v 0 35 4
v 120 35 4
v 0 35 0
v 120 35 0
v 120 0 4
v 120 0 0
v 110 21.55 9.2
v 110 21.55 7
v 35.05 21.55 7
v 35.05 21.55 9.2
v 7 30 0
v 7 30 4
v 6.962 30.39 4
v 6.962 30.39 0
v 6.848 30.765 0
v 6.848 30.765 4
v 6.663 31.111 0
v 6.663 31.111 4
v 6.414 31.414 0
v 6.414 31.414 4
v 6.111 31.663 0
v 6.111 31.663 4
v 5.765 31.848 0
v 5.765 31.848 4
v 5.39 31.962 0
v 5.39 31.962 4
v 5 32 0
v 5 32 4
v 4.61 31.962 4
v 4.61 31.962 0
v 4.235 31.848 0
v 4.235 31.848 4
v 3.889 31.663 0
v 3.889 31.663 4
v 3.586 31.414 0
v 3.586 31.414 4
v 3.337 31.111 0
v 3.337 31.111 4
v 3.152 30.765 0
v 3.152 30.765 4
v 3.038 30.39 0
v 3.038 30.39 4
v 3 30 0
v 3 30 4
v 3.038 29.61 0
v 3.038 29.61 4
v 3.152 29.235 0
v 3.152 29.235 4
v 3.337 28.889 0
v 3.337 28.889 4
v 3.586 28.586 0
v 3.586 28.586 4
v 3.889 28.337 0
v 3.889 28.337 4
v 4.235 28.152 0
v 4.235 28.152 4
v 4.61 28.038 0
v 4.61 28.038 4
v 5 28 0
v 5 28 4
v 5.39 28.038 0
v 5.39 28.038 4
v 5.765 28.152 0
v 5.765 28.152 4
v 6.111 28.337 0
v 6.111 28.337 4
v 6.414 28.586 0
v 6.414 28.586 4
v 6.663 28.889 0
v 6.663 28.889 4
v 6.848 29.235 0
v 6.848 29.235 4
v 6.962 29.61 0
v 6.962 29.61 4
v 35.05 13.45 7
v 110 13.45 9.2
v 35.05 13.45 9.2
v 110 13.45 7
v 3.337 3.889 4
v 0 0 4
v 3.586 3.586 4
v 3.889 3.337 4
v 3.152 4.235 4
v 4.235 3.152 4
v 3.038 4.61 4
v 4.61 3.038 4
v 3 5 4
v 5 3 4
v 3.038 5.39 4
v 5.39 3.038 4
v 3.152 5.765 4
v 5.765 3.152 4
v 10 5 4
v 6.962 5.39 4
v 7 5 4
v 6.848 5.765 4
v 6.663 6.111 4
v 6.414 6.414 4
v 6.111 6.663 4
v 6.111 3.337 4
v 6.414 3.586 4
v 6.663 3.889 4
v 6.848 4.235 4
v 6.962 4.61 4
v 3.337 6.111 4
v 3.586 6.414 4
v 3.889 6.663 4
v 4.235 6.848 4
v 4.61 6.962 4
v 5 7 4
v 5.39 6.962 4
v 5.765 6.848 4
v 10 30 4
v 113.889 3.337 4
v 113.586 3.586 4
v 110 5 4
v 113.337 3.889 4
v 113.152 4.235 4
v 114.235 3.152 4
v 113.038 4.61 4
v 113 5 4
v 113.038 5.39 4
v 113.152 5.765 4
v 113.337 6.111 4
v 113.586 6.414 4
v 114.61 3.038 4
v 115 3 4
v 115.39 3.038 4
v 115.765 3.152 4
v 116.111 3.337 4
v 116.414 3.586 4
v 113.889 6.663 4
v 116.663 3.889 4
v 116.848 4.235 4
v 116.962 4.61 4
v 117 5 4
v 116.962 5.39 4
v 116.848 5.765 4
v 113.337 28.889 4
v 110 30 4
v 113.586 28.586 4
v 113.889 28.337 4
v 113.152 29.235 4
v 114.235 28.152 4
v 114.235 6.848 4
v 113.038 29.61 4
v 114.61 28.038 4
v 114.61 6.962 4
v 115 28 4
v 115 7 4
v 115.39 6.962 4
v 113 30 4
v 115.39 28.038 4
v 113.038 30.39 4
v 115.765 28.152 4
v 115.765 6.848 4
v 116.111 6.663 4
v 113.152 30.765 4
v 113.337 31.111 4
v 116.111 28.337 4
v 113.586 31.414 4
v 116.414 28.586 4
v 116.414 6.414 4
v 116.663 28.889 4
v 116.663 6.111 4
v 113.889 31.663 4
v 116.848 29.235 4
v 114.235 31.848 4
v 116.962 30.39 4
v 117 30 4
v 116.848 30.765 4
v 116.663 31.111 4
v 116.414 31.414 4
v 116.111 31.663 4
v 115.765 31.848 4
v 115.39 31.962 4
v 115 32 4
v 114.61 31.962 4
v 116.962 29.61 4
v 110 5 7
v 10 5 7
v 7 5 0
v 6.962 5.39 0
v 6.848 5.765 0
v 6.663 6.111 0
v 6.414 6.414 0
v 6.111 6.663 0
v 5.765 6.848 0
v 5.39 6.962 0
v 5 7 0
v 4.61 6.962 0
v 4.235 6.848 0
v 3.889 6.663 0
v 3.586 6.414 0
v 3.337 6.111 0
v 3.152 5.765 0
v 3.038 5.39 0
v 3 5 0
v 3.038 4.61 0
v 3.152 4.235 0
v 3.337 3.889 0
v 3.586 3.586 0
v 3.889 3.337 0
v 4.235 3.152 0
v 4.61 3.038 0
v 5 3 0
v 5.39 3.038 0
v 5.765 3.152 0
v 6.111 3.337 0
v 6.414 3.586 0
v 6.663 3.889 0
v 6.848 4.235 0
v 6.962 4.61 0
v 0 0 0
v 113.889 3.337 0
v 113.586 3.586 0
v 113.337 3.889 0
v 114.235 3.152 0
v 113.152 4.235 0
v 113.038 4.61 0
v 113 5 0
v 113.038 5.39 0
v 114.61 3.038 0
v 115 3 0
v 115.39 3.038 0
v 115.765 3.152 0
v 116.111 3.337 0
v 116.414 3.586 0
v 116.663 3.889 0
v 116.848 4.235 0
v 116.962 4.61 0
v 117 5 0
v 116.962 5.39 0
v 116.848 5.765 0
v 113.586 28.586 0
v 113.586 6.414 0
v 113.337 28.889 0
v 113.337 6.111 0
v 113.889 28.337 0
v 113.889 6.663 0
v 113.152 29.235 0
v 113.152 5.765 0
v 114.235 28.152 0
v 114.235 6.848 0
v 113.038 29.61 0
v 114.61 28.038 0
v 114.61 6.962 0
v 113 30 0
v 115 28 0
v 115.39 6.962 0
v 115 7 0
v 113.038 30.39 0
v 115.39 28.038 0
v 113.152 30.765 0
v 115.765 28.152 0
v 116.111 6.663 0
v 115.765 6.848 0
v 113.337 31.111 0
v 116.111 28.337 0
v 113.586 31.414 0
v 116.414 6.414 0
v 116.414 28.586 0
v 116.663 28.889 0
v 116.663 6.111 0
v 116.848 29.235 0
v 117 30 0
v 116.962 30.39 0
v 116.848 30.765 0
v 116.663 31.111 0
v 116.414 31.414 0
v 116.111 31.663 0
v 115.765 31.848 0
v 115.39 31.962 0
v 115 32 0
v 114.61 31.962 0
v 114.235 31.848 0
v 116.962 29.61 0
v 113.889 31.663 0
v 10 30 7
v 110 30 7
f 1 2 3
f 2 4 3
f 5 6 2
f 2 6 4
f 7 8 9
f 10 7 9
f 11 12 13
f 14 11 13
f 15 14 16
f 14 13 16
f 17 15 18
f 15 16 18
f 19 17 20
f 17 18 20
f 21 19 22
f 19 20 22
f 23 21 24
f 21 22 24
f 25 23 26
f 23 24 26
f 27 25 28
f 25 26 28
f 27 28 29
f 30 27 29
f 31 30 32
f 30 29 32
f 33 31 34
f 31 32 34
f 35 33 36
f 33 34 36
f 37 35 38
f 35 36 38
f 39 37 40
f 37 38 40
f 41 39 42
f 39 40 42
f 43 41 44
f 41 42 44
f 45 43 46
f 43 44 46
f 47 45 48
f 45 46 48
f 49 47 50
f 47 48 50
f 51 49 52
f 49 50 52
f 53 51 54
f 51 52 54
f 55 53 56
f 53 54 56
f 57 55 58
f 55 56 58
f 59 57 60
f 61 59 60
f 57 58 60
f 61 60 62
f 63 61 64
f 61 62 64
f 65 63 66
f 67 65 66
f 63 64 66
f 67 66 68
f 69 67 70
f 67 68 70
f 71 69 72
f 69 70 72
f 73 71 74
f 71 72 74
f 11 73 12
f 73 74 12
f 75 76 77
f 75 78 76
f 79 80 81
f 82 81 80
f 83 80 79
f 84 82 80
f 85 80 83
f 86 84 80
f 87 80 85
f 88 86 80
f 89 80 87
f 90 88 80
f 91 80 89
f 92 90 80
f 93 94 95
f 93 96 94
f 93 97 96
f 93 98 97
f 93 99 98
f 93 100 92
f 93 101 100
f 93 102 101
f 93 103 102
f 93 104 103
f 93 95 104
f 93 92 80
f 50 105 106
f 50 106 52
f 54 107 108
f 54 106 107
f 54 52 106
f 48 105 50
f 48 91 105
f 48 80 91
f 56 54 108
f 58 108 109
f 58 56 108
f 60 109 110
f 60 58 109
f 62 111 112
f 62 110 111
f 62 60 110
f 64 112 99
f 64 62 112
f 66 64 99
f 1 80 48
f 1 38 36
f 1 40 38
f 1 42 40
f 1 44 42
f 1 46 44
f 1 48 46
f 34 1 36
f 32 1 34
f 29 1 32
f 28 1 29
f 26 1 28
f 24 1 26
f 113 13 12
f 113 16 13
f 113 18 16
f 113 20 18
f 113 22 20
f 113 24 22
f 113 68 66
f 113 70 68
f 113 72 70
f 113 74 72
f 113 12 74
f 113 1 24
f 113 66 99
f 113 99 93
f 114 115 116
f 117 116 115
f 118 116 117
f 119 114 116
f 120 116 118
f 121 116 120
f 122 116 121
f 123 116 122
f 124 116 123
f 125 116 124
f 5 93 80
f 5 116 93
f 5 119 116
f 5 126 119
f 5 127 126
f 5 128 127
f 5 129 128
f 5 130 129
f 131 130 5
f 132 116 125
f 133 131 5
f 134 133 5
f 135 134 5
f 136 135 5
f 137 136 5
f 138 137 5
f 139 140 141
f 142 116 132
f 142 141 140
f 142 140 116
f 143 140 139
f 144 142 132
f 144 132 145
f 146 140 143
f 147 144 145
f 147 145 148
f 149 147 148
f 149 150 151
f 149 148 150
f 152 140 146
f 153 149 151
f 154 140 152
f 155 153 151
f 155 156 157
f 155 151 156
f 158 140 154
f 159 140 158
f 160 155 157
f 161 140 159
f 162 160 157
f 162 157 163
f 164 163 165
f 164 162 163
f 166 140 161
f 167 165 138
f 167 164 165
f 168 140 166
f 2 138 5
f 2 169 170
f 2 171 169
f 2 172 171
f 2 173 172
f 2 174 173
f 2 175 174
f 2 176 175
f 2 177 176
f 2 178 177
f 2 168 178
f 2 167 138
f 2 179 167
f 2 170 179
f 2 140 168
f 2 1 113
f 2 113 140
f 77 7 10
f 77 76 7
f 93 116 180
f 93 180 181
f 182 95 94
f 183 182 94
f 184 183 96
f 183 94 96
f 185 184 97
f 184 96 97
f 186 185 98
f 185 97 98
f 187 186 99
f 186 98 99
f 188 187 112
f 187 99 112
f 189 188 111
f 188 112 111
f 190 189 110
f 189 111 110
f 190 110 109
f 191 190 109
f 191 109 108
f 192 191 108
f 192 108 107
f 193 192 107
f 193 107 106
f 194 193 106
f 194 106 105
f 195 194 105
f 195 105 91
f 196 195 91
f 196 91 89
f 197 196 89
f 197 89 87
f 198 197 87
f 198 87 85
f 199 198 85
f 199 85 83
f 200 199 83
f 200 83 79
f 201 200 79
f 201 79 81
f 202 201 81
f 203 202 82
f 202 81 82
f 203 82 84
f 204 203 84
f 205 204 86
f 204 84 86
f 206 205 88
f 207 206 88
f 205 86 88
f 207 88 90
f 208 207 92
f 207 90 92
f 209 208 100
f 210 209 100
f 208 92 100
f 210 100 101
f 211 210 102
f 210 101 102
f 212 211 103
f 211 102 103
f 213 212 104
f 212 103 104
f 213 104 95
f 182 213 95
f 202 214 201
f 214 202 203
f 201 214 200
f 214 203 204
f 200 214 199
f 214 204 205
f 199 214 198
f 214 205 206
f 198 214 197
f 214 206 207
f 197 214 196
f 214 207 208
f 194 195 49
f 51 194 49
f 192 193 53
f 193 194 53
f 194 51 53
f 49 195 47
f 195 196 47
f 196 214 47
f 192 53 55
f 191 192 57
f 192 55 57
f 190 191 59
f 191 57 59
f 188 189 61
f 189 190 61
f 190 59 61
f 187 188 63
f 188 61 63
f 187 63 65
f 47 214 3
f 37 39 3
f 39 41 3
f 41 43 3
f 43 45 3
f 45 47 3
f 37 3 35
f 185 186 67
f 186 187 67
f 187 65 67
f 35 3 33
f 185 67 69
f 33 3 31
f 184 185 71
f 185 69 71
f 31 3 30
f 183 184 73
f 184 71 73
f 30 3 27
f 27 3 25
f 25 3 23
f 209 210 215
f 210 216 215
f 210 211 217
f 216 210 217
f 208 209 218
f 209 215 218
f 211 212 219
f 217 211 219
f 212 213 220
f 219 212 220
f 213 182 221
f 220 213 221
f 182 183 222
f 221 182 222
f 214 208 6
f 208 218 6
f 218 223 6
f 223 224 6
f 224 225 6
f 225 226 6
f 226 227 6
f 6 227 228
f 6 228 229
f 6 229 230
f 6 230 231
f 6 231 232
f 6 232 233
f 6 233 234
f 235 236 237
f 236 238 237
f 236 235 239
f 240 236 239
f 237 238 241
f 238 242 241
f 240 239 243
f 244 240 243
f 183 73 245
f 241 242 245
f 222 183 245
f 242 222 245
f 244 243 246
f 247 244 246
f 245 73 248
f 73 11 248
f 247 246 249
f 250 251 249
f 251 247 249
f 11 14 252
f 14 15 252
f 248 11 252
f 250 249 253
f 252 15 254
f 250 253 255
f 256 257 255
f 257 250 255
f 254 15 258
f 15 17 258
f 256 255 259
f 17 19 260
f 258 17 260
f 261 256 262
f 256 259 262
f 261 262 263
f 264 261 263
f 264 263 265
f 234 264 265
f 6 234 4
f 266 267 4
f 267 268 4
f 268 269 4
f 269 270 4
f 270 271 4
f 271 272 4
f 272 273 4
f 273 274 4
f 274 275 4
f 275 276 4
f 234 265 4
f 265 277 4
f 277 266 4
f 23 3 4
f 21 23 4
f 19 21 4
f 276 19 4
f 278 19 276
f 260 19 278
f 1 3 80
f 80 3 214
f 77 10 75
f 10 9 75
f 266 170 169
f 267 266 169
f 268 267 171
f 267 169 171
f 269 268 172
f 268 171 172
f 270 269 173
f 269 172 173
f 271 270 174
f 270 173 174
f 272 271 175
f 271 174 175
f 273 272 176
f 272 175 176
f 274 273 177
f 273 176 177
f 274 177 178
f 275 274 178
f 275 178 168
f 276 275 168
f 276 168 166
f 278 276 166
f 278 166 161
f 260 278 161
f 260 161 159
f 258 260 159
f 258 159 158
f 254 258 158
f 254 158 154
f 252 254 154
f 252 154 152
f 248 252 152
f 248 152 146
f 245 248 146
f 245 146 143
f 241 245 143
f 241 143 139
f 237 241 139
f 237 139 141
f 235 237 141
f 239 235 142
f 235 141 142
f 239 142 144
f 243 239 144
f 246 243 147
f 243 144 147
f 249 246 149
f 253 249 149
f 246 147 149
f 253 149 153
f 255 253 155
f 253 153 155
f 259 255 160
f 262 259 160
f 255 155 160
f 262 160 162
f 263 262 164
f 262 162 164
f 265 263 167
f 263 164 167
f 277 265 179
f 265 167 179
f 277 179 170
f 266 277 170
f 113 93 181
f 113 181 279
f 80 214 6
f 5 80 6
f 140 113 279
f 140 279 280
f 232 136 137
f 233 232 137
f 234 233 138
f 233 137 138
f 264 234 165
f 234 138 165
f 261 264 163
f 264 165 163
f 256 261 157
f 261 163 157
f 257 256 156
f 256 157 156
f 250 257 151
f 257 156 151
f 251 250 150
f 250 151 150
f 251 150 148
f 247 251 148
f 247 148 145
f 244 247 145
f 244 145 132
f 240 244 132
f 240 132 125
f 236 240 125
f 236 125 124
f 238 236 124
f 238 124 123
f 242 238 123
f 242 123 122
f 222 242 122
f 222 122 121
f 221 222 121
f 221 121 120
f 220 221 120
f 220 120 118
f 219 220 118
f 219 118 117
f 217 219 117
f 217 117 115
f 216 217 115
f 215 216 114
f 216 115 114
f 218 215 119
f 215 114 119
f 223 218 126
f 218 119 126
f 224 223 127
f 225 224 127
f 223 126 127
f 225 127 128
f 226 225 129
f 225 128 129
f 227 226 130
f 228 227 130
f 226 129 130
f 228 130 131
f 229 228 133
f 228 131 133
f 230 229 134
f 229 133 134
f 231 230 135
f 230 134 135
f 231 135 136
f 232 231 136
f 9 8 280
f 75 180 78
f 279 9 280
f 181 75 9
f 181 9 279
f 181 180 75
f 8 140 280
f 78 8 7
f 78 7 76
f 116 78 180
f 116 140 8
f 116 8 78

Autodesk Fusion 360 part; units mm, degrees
sketch "Esboço1" plane through (0, 0, 0) normal (0, 0, 1) x (1, 0, 0)
  line L0 (0, 0) -> (120, 0)
  line L1 (120, 0) -> (120, 35)
  line L2 (120, 35) -> (0, 35)
  line L3 (0, 35) -> (0, 0)
  dimension "d1" = 120
  dimension "d2" = 35
extrude "Extrusão1" add sketch "Esboço1" along normal blind 4
sketch "Esboço2" plane through (0, 0, 4) normal (0, 0, 1) x (-1, 0, 0)
  line L0 (0, -35) -> (0, 0)
  line L1 (0, 0) -> (-120, 0)
  line L2 (-120, 0) -> (-120, -35)
  line L3 (-120, -35) -> (0, -35)
  line L4 (-10, -30) -> (-110, -30)
  line L5 (-110, -30) -> (-110, -5)
  line L6 (-110, -5) -> (-10, -5)
  line L7 (-10, -5) -> (-10, -30)
  point P0 (-5, -30)
  point P1 (-5, -5)
  point P2 (-115, -5)
  point P3 (-115, -30)
sketch "Esboço8" plane through (0, 0, 4) normal (0, 0, 1) x (1, 0, 0)
  circle A0 centre (5, 30) radius 2
  circle A1 centre (5, 5) radius 2
  circle A2 centre (115, 30) radius 2
  circle A3 centre (115, 5) radius 2
  dimension "d18" = 4
  dimension "d19" = 4
  dimension "d20" = 4
  dimension "d21" = 4
extrude "Extrusão7" cut sketch "Esboço8" against normal blind 20
extrude "Extrusão10" add sketch "Esboço2" along normal blind 3 contours L4 L5 L6 L7
sketch "Esboço10" plane through (0, 0, 7) normal (0, 0, 1) x (-1, 0, 0)
  line L0 (-10, -5) -> (-110, -5)
  line L1 (-110, -5) -> (-110, -30)
  line L2 (-110, -30) -> (-10, -30)
  line L3 (-10, -30) -> (-10, -5)
  line L4 (-110, -30) -> (-110, -21.55)
  line L5 (-110, -5) -> (-110, -13.45)
  line L6 (-110, -21.55) -> (-35.05, -21.55)
  line L7 (-110, -13.45) -> (-35.05, -13.45)
  line L8 (-35.05, -21.55) -> (-35.05, -13.45)
  dimension "d35" = 8.45
  dimension "d36" = 8.45
  dimension "d37" = 74.95
  dimension "d38" = 74.95
extrude "Extrusão11" add sketch "Esboço10" along normal blind 2.2 contours L1 L6 L7 L8
